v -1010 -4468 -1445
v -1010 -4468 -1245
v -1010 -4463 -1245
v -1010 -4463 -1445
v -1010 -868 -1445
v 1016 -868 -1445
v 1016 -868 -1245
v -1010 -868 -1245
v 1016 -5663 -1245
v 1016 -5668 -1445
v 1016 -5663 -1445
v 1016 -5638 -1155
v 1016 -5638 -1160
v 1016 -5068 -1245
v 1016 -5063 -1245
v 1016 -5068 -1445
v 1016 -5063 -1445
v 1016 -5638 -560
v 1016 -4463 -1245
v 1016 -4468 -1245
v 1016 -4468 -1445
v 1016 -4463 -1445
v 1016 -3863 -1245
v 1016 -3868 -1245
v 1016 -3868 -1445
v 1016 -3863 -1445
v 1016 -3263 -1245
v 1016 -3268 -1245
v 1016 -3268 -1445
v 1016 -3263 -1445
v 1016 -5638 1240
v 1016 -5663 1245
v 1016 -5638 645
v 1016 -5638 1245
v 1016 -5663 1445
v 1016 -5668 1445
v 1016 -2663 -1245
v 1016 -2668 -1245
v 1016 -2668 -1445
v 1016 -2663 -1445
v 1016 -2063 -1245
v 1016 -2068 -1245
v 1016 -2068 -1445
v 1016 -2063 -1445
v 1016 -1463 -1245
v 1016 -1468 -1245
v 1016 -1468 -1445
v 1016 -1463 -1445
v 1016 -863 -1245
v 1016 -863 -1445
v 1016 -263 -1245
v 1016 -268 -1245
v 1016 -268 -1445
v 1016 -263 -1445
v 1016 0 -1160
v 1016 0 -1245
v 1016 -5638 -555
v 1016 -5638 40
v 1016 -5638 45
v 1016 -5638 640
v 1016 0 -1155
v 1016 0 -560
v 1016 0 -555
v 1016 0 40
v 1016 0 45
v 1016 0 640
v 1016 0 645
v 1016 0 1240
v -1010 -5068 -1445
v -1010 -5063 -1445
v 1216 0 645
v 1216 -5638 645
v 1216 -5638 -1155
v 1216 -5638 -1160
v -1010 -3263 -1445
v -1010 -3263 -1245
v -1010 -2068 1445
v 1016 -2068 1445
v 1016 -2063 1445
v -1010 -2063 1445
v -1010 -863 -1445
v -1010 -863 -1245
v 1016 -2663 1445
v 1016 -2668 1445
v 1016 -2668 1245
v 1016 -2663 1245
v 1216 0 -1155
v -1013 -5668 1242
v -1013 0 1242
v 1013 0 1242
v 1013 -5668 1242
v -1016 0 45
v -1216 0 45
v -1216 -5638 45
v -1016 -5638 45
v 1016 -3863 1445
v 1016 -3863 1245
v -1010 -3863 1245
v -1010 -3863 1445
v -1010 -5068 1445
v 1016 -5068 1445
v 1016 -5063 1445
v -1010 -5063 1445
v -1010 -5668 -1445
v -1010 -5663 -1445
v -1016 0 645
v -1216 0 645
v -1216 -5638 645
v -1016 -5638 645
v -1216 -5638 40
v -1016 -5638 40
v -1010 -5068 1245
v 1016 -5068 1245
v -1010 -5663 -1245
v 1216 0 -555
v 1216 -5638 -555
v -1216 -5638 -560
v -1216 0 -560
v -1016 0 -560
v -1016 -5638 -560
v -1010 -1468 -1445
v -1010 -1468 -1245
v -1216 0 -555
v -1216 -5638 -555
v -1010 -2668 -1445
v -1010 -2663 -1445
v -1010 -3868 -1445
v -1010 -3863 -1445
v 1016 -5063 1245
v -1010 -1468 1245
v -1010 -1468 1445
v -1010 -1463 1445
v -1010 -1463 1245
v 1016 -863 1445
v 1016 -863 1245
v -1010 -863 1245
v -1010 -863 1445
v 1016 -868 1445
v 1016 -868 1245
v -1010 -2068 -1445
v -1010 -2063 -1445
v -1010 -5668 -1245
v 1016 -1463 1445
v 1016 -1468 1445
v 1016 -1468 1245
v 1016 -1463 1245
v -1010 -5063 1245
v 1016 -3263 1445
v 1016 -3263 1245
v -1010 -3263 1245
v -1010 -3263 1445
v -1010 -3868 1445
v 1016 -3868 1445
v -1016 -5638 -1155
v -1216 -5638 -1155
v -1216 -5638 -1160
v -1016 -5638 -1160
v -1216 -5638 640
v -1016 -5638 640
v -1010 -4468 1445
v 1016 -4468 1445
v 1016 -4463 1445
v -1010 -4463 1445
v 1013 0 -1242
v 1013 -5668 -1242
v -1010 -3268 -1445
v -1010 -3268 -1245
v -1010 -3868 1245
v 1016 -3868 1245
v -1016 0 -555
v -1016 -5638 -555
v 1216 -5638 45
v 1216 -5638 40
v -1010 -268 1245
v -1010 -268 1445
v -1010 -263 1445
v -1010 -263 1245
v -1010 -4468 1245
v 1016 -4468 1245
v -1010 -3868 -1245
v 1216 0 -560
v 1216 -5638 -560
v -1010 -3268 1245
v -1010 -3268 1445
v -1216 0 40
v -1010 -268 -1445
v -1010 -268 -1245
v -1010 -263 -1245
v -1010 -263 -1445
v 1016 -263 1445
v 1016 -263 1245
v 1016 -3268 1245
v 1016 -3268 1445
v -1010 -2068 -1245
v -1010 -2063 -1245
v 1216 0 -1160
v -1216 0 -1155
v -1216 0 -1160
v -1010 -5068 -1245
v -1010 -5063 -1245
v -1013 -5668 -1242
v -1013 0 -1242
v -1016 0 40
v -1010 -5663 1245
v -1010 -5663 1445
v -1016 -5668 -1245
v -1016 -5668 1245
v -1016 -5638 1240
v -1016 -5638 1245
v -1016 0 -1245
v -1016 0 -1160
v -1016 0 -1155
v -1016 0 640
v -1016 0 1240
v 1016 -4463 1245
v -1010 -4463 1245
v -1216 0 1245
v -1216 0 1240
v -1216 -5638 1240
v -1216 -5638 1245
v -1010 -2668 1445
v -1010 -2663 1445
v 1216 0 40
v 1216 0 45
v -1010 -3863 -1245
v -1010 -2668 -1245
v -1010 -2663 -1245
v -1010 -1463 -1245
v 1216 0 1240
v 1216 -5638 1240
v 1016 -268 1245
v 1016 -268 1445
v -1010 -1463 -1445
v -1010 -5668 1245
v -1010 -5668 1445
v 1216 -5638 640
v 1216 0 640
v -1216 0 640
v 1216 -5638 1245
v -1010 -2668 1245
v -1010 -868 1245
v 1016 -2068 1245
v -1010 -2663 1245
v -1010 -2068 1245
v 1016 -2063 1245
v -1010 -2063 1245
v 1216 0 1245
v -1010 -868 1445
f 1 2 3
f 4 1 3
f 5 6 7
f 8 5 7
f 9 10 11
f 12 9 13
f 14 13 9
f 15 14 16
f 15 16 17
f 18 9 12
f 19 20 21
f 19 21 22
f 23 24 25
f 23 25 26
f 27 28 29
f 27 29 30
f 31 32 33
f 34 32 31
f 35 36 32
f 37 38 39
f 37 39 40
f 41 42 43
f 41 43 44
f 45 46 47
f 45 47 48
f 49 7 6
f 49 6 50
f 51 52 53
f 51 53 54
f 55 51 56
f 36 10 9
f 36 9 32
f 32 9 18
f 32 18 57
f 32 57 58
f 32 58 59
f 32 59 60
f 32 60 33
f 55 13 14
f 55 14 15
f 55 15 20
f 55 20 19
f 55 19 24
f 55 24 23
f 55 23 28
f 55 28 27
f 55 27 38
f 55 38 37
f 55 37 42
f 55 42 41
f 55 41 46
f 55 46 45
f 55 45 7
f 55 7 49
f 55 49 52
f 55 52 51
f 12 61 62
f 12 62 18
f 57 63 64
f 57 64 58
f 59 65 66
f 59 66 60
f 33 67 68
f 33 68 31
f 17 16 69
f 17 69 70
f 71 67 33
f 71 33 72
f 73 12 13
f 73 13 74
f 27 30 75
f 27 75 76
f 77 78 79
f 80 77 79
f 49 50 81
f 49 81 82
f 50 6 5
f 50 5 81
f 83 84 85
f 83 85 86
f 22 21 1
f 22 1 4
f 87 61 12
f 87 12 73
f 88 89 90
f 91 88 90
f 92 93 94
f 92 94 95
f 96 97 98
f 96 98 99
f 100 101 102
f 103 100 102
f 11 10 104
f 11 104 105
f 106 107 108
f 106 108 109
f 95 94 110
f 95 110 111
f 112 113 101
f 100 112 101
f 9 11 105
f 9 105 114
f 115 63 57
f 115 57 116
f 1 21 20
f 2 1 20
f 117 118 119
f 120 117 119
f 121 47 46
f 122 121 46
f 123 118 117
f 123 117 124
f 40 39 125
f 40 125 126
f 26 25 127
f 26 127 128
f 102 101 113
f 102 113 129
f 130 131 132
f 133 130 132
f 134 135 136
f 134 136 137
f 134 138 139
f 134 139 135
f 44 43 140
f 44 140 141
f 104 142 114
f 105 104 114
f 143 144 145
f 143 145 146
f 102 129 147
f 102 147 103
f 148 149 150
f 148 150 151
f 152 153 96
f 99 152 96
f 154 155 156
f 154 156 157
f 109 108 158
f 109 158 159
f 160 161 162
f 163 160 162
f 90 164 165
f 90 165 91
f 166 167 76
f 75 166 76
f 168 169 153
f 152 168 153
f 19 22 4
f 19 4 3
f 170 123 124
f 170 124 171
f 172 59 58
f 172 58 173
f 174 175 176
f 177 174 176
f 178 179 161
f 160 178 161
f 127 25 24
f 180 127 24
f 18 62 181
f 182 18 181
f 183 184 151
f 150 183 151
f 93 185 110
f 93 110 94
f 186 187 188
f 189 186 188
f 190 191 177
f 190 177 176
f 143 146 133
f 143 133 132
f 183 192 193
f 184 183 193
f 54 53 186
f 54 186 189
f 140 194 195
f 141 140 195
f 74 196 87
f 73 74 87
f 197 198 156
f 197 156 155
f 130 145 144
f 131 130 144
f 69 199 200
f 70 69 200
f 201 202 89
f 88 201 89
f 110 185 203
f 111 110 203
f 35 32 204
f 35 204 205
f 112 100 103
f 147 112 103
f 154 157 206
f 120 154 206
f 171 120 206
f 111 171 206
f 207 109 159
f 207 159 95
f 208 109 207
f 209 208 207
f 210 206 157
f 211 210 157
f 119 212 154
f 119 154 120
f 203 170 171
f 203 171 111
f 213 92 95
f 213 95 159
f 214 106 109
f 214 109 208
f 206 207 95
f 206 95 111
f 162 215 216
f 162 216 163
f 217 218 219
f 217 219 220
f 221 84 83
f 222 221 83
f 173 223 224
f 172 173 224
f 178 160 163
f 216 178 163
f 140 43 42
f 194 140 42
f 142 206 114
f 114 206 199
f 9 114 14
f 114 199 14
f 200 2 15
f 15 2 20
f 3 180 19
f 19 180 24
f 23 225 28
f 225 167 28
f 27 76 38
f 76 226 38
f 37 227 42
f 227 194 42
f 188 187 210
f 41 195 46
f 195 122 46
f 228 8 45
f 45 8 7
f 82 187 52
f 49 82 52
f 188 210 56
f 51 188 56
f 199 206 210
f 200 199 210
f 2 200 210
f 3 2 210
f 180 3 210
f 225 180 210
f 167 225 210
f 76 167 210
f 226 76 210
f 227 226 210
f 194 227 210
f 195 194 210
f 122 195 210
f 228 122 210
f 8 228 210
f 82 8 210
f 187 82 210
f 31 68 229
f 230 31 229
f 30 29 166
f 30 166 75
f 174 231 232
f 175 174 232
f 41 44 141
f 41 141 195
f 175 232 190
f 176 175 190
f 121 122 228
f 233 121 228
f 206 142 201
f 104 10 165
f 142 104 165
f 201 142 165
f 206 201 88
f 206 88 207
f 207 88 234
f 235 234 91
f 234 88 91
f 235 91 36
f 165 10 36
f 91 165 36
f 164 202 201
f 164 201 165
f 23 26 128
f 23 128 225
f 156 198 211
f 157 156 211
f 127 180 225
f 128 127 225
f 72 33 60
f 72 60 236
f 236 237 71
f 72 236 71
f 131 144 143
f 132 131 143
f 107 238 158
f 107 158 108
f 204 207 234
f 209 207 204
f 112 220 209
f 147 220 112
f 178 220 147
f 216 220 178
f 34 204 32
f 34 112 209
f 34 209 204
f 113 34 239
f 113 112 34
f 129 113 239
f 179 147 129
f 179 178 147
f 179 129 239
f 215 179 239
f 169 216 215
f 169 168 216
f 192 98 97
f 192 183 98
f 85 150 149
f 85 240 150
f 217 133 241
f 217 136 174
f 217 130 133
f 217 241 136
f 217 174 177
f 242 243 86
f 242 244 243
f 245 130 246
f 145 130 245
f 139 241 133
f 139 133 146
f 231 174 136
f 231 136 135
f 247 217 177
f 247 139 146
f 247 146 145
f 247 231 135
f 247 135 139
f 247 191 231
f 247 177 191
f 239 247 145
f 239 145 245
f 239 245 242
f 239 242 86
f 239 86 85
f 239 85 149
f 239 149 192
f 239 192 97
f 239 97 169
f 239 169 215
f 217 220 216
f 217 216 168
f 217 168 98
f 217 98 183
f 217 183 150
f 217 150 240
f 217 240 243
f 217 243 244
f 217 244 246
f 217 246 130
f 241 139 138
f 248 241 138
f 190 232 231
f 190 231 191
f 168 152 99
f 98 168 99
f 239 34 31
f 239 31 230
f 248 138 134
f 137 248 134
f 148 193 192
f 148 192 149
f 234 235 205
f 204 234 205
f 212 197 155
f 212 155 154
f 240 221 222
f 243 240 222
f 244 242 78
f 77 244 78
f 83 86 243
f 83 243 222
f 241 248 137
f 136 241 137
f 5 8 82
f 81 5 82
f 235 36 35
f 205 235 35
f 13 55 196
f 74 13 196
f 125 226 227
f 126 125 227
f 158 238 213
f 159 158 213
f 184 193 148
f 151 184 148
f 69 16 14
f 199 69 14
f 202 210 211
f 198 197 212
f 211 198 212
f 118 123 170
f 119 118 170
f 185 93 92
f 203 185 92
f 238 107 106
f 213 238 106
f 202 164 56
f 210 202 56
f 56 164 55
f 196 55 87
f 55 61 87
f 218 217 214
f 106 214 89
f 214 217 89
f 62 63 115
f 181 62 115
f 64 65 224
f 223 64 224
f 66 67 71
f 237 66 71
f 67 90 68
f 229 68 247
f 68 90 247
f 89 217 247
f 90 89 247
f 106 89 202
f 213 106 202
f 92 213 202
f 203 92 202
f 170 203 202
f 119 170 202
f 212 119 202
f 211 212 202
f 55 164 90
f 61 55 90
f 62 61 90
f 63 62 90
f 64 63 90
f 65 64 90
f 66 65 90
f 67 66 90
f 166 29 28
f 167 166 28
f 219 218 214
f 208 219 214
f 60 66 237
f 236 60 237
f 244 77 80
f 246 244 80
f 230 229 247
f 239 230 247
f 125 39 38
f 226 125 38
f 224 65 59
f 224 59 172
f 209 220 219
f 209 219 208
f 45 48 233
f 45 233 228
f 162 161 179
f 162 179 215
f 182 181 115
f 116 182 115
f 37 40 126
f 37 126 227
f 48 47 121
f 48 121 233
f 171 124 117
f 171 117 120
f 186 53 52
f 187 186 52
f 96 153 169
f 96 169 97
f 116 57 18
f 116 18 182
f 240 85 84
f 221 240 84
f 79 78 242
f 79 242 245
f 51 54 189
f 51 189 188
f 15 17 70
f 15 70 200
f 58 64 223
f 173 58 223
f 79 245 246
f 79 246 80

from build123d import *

# Parameters (mm, degrees)
F0_W     = 2032
F0_H     = 2490
F0_W_2   = 2026
F0_H_2   = 2484
F1_DEPTH = 5668
F2_W     = 200
F2_H     = 5
F3_DEPTH = 5638
F4_W     = 5
F4_H     = 200
F5_DEPTH = 2026


with BuildPart() as f1:
    # F0 (on Front) → F1 (new body)
    with BuildSketch(Plane.XZ):
        Rectangle(F0_W, F0_H)
        Rectangle(F0_W_2, F0_H_2, mode=Mode.SUBTRACT)
    extrude(amount=F1_DEPTH)

    # F2 (on Front) → F3 (join)
    with BuildSketch(Plane.XZ):
        with Locations((1116, 1242.5)):
            Rectangle(F2_W, F2_H)
        with Locations((1116, 642.5)):
            Rectangle(F2_W, F2_H)
        with Locations((1116, 42.5)):
            Rectangle(F2_W, F2_H)
        with Locations((1116, -557.5)):
            Rectangle(F2_W, F2_H)
        with Locations((1116, -1157.5)):
            Rectangle(F2_W, F2_H)
        with Locations((-1116, 1242.5)):
            Rectangle(F2_W, F2_H)
        with Locations((-1116, 642.5)):
            Rectangle(F2_W, F2_H)
        with Locations((-1116, 42.5)):
            Rectangle(F2_W, F2_H)
        with Locations((-1116, -557.5)):
            Rectangle(F2_W, F2_H)
        with Locations((-1116, -1157.5)):
            Rectangle(F2_W, F2_H)
    extrude(amount=F3_DEPTH)

    # F4 (on face) → F5 (join)
    with BuildSketch(Plane.YZ.offset(1016)):
        with Locations((-5665.5, 1345)):
            Rectangle(F4_W, F4_H)
        with Locations((-5065.5, 1345)):
            Rectangle(F4_W, F4_H)
        with Locations((-4465.5, 1345)):
            Rectangle(F4_W, F4_H)
        with Locations((-3865.5, 1345)):
            Rectangle(F4_W, F4_H)
        with Locations((-3265.5, 1345)):
            Rectangle(F4_W, F4_H)
        with Locations((-2665.5, 1345)):
            Rectangle(F4_W, F4_H)
        with Locations((-2065.5, 1345)):
            Rectangle(F4_W, F4_H)
        with Locations((-1465.5, 1345)):
            Rectangle(F4_W, F4_H)
        with Locations((-865.5, 1345)):
            Rectangle(F4_W, F4_H)
        with Locations((-265.5, 1345)):
            Rectangle(F4_W, F4_H)
        with Locations((-5665.5, -1345)):
            Rectangle(F4_W, F4_H)
        with Locations((-5065.5, -1345)):
            Rectangle(F4_W, F4_H)
        with Locations((-4465.5, -1345)):
            Rectangle(F4_W, F4_H)
        with Locations((-3865.5, -1345)):
            Rectangle(F4_W, F4_H)
        with Locations((-3265.5, -1345)):
            Rectangle(F4_W, F4_H)
        with Locations((-2665.5, -1345)):
            Rectangle(F4_W, F4_H)
        with Locations((-2065.5, -1345)):
            Rectangle(F4_W, F4_H)
        with Locations((-1465.5, -1345)):
            Rectangle(F4_W, F4_H)
        with Locations((-865.5, -1345)):
            Rectangle(F4_W, F4_H)
        with Locations((-265.5, -1345)):
            Rectangle(F4_W, F4_H)
    extrude(amount=-F5_DEPTH)


solid = f1.part
